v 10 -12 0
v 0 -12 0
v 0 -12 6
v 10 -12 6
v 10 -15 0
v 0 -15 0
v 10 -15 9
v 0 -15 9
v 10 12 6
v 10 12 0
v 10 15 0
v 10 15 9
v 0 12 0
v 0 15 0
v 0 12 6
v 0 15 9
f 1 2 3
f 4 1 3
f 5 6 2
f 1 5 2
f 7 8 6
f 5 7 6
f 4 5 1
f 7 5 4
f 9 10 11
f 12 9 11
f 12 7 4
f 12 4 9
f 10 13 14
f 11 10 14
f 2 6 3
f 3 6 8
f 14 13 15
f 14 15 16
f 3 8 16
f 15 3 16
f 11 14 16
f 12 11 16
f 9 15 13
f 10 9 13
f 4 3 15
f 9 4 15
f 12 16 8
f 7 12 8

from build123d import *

# Parameters (mm, degrees)
F0_W     = 12
F0_H     = 3
F1_DEPTH = 10


with BuildPart() as f1:
    # F0 (on Right) → F1 (new body)
    with BuildSketch(Plane.YZ):
        Polygon((-15, 9), (-15, 0), (-12, 0), (-12, 6), (-12, 9), align=None)
        with Locations((-6, 7.5)):
            Rectangle(F0_W, F0_H)
        with Locations((6, 7.5)):
            Rectangle(F0_W, F0_H)
        Polygon((12, 9), (12, 6), (12, 0), (15, 0), (15, 9), align=None)
    extrude(amount=F1_DEPTH)


solid = f1.part
